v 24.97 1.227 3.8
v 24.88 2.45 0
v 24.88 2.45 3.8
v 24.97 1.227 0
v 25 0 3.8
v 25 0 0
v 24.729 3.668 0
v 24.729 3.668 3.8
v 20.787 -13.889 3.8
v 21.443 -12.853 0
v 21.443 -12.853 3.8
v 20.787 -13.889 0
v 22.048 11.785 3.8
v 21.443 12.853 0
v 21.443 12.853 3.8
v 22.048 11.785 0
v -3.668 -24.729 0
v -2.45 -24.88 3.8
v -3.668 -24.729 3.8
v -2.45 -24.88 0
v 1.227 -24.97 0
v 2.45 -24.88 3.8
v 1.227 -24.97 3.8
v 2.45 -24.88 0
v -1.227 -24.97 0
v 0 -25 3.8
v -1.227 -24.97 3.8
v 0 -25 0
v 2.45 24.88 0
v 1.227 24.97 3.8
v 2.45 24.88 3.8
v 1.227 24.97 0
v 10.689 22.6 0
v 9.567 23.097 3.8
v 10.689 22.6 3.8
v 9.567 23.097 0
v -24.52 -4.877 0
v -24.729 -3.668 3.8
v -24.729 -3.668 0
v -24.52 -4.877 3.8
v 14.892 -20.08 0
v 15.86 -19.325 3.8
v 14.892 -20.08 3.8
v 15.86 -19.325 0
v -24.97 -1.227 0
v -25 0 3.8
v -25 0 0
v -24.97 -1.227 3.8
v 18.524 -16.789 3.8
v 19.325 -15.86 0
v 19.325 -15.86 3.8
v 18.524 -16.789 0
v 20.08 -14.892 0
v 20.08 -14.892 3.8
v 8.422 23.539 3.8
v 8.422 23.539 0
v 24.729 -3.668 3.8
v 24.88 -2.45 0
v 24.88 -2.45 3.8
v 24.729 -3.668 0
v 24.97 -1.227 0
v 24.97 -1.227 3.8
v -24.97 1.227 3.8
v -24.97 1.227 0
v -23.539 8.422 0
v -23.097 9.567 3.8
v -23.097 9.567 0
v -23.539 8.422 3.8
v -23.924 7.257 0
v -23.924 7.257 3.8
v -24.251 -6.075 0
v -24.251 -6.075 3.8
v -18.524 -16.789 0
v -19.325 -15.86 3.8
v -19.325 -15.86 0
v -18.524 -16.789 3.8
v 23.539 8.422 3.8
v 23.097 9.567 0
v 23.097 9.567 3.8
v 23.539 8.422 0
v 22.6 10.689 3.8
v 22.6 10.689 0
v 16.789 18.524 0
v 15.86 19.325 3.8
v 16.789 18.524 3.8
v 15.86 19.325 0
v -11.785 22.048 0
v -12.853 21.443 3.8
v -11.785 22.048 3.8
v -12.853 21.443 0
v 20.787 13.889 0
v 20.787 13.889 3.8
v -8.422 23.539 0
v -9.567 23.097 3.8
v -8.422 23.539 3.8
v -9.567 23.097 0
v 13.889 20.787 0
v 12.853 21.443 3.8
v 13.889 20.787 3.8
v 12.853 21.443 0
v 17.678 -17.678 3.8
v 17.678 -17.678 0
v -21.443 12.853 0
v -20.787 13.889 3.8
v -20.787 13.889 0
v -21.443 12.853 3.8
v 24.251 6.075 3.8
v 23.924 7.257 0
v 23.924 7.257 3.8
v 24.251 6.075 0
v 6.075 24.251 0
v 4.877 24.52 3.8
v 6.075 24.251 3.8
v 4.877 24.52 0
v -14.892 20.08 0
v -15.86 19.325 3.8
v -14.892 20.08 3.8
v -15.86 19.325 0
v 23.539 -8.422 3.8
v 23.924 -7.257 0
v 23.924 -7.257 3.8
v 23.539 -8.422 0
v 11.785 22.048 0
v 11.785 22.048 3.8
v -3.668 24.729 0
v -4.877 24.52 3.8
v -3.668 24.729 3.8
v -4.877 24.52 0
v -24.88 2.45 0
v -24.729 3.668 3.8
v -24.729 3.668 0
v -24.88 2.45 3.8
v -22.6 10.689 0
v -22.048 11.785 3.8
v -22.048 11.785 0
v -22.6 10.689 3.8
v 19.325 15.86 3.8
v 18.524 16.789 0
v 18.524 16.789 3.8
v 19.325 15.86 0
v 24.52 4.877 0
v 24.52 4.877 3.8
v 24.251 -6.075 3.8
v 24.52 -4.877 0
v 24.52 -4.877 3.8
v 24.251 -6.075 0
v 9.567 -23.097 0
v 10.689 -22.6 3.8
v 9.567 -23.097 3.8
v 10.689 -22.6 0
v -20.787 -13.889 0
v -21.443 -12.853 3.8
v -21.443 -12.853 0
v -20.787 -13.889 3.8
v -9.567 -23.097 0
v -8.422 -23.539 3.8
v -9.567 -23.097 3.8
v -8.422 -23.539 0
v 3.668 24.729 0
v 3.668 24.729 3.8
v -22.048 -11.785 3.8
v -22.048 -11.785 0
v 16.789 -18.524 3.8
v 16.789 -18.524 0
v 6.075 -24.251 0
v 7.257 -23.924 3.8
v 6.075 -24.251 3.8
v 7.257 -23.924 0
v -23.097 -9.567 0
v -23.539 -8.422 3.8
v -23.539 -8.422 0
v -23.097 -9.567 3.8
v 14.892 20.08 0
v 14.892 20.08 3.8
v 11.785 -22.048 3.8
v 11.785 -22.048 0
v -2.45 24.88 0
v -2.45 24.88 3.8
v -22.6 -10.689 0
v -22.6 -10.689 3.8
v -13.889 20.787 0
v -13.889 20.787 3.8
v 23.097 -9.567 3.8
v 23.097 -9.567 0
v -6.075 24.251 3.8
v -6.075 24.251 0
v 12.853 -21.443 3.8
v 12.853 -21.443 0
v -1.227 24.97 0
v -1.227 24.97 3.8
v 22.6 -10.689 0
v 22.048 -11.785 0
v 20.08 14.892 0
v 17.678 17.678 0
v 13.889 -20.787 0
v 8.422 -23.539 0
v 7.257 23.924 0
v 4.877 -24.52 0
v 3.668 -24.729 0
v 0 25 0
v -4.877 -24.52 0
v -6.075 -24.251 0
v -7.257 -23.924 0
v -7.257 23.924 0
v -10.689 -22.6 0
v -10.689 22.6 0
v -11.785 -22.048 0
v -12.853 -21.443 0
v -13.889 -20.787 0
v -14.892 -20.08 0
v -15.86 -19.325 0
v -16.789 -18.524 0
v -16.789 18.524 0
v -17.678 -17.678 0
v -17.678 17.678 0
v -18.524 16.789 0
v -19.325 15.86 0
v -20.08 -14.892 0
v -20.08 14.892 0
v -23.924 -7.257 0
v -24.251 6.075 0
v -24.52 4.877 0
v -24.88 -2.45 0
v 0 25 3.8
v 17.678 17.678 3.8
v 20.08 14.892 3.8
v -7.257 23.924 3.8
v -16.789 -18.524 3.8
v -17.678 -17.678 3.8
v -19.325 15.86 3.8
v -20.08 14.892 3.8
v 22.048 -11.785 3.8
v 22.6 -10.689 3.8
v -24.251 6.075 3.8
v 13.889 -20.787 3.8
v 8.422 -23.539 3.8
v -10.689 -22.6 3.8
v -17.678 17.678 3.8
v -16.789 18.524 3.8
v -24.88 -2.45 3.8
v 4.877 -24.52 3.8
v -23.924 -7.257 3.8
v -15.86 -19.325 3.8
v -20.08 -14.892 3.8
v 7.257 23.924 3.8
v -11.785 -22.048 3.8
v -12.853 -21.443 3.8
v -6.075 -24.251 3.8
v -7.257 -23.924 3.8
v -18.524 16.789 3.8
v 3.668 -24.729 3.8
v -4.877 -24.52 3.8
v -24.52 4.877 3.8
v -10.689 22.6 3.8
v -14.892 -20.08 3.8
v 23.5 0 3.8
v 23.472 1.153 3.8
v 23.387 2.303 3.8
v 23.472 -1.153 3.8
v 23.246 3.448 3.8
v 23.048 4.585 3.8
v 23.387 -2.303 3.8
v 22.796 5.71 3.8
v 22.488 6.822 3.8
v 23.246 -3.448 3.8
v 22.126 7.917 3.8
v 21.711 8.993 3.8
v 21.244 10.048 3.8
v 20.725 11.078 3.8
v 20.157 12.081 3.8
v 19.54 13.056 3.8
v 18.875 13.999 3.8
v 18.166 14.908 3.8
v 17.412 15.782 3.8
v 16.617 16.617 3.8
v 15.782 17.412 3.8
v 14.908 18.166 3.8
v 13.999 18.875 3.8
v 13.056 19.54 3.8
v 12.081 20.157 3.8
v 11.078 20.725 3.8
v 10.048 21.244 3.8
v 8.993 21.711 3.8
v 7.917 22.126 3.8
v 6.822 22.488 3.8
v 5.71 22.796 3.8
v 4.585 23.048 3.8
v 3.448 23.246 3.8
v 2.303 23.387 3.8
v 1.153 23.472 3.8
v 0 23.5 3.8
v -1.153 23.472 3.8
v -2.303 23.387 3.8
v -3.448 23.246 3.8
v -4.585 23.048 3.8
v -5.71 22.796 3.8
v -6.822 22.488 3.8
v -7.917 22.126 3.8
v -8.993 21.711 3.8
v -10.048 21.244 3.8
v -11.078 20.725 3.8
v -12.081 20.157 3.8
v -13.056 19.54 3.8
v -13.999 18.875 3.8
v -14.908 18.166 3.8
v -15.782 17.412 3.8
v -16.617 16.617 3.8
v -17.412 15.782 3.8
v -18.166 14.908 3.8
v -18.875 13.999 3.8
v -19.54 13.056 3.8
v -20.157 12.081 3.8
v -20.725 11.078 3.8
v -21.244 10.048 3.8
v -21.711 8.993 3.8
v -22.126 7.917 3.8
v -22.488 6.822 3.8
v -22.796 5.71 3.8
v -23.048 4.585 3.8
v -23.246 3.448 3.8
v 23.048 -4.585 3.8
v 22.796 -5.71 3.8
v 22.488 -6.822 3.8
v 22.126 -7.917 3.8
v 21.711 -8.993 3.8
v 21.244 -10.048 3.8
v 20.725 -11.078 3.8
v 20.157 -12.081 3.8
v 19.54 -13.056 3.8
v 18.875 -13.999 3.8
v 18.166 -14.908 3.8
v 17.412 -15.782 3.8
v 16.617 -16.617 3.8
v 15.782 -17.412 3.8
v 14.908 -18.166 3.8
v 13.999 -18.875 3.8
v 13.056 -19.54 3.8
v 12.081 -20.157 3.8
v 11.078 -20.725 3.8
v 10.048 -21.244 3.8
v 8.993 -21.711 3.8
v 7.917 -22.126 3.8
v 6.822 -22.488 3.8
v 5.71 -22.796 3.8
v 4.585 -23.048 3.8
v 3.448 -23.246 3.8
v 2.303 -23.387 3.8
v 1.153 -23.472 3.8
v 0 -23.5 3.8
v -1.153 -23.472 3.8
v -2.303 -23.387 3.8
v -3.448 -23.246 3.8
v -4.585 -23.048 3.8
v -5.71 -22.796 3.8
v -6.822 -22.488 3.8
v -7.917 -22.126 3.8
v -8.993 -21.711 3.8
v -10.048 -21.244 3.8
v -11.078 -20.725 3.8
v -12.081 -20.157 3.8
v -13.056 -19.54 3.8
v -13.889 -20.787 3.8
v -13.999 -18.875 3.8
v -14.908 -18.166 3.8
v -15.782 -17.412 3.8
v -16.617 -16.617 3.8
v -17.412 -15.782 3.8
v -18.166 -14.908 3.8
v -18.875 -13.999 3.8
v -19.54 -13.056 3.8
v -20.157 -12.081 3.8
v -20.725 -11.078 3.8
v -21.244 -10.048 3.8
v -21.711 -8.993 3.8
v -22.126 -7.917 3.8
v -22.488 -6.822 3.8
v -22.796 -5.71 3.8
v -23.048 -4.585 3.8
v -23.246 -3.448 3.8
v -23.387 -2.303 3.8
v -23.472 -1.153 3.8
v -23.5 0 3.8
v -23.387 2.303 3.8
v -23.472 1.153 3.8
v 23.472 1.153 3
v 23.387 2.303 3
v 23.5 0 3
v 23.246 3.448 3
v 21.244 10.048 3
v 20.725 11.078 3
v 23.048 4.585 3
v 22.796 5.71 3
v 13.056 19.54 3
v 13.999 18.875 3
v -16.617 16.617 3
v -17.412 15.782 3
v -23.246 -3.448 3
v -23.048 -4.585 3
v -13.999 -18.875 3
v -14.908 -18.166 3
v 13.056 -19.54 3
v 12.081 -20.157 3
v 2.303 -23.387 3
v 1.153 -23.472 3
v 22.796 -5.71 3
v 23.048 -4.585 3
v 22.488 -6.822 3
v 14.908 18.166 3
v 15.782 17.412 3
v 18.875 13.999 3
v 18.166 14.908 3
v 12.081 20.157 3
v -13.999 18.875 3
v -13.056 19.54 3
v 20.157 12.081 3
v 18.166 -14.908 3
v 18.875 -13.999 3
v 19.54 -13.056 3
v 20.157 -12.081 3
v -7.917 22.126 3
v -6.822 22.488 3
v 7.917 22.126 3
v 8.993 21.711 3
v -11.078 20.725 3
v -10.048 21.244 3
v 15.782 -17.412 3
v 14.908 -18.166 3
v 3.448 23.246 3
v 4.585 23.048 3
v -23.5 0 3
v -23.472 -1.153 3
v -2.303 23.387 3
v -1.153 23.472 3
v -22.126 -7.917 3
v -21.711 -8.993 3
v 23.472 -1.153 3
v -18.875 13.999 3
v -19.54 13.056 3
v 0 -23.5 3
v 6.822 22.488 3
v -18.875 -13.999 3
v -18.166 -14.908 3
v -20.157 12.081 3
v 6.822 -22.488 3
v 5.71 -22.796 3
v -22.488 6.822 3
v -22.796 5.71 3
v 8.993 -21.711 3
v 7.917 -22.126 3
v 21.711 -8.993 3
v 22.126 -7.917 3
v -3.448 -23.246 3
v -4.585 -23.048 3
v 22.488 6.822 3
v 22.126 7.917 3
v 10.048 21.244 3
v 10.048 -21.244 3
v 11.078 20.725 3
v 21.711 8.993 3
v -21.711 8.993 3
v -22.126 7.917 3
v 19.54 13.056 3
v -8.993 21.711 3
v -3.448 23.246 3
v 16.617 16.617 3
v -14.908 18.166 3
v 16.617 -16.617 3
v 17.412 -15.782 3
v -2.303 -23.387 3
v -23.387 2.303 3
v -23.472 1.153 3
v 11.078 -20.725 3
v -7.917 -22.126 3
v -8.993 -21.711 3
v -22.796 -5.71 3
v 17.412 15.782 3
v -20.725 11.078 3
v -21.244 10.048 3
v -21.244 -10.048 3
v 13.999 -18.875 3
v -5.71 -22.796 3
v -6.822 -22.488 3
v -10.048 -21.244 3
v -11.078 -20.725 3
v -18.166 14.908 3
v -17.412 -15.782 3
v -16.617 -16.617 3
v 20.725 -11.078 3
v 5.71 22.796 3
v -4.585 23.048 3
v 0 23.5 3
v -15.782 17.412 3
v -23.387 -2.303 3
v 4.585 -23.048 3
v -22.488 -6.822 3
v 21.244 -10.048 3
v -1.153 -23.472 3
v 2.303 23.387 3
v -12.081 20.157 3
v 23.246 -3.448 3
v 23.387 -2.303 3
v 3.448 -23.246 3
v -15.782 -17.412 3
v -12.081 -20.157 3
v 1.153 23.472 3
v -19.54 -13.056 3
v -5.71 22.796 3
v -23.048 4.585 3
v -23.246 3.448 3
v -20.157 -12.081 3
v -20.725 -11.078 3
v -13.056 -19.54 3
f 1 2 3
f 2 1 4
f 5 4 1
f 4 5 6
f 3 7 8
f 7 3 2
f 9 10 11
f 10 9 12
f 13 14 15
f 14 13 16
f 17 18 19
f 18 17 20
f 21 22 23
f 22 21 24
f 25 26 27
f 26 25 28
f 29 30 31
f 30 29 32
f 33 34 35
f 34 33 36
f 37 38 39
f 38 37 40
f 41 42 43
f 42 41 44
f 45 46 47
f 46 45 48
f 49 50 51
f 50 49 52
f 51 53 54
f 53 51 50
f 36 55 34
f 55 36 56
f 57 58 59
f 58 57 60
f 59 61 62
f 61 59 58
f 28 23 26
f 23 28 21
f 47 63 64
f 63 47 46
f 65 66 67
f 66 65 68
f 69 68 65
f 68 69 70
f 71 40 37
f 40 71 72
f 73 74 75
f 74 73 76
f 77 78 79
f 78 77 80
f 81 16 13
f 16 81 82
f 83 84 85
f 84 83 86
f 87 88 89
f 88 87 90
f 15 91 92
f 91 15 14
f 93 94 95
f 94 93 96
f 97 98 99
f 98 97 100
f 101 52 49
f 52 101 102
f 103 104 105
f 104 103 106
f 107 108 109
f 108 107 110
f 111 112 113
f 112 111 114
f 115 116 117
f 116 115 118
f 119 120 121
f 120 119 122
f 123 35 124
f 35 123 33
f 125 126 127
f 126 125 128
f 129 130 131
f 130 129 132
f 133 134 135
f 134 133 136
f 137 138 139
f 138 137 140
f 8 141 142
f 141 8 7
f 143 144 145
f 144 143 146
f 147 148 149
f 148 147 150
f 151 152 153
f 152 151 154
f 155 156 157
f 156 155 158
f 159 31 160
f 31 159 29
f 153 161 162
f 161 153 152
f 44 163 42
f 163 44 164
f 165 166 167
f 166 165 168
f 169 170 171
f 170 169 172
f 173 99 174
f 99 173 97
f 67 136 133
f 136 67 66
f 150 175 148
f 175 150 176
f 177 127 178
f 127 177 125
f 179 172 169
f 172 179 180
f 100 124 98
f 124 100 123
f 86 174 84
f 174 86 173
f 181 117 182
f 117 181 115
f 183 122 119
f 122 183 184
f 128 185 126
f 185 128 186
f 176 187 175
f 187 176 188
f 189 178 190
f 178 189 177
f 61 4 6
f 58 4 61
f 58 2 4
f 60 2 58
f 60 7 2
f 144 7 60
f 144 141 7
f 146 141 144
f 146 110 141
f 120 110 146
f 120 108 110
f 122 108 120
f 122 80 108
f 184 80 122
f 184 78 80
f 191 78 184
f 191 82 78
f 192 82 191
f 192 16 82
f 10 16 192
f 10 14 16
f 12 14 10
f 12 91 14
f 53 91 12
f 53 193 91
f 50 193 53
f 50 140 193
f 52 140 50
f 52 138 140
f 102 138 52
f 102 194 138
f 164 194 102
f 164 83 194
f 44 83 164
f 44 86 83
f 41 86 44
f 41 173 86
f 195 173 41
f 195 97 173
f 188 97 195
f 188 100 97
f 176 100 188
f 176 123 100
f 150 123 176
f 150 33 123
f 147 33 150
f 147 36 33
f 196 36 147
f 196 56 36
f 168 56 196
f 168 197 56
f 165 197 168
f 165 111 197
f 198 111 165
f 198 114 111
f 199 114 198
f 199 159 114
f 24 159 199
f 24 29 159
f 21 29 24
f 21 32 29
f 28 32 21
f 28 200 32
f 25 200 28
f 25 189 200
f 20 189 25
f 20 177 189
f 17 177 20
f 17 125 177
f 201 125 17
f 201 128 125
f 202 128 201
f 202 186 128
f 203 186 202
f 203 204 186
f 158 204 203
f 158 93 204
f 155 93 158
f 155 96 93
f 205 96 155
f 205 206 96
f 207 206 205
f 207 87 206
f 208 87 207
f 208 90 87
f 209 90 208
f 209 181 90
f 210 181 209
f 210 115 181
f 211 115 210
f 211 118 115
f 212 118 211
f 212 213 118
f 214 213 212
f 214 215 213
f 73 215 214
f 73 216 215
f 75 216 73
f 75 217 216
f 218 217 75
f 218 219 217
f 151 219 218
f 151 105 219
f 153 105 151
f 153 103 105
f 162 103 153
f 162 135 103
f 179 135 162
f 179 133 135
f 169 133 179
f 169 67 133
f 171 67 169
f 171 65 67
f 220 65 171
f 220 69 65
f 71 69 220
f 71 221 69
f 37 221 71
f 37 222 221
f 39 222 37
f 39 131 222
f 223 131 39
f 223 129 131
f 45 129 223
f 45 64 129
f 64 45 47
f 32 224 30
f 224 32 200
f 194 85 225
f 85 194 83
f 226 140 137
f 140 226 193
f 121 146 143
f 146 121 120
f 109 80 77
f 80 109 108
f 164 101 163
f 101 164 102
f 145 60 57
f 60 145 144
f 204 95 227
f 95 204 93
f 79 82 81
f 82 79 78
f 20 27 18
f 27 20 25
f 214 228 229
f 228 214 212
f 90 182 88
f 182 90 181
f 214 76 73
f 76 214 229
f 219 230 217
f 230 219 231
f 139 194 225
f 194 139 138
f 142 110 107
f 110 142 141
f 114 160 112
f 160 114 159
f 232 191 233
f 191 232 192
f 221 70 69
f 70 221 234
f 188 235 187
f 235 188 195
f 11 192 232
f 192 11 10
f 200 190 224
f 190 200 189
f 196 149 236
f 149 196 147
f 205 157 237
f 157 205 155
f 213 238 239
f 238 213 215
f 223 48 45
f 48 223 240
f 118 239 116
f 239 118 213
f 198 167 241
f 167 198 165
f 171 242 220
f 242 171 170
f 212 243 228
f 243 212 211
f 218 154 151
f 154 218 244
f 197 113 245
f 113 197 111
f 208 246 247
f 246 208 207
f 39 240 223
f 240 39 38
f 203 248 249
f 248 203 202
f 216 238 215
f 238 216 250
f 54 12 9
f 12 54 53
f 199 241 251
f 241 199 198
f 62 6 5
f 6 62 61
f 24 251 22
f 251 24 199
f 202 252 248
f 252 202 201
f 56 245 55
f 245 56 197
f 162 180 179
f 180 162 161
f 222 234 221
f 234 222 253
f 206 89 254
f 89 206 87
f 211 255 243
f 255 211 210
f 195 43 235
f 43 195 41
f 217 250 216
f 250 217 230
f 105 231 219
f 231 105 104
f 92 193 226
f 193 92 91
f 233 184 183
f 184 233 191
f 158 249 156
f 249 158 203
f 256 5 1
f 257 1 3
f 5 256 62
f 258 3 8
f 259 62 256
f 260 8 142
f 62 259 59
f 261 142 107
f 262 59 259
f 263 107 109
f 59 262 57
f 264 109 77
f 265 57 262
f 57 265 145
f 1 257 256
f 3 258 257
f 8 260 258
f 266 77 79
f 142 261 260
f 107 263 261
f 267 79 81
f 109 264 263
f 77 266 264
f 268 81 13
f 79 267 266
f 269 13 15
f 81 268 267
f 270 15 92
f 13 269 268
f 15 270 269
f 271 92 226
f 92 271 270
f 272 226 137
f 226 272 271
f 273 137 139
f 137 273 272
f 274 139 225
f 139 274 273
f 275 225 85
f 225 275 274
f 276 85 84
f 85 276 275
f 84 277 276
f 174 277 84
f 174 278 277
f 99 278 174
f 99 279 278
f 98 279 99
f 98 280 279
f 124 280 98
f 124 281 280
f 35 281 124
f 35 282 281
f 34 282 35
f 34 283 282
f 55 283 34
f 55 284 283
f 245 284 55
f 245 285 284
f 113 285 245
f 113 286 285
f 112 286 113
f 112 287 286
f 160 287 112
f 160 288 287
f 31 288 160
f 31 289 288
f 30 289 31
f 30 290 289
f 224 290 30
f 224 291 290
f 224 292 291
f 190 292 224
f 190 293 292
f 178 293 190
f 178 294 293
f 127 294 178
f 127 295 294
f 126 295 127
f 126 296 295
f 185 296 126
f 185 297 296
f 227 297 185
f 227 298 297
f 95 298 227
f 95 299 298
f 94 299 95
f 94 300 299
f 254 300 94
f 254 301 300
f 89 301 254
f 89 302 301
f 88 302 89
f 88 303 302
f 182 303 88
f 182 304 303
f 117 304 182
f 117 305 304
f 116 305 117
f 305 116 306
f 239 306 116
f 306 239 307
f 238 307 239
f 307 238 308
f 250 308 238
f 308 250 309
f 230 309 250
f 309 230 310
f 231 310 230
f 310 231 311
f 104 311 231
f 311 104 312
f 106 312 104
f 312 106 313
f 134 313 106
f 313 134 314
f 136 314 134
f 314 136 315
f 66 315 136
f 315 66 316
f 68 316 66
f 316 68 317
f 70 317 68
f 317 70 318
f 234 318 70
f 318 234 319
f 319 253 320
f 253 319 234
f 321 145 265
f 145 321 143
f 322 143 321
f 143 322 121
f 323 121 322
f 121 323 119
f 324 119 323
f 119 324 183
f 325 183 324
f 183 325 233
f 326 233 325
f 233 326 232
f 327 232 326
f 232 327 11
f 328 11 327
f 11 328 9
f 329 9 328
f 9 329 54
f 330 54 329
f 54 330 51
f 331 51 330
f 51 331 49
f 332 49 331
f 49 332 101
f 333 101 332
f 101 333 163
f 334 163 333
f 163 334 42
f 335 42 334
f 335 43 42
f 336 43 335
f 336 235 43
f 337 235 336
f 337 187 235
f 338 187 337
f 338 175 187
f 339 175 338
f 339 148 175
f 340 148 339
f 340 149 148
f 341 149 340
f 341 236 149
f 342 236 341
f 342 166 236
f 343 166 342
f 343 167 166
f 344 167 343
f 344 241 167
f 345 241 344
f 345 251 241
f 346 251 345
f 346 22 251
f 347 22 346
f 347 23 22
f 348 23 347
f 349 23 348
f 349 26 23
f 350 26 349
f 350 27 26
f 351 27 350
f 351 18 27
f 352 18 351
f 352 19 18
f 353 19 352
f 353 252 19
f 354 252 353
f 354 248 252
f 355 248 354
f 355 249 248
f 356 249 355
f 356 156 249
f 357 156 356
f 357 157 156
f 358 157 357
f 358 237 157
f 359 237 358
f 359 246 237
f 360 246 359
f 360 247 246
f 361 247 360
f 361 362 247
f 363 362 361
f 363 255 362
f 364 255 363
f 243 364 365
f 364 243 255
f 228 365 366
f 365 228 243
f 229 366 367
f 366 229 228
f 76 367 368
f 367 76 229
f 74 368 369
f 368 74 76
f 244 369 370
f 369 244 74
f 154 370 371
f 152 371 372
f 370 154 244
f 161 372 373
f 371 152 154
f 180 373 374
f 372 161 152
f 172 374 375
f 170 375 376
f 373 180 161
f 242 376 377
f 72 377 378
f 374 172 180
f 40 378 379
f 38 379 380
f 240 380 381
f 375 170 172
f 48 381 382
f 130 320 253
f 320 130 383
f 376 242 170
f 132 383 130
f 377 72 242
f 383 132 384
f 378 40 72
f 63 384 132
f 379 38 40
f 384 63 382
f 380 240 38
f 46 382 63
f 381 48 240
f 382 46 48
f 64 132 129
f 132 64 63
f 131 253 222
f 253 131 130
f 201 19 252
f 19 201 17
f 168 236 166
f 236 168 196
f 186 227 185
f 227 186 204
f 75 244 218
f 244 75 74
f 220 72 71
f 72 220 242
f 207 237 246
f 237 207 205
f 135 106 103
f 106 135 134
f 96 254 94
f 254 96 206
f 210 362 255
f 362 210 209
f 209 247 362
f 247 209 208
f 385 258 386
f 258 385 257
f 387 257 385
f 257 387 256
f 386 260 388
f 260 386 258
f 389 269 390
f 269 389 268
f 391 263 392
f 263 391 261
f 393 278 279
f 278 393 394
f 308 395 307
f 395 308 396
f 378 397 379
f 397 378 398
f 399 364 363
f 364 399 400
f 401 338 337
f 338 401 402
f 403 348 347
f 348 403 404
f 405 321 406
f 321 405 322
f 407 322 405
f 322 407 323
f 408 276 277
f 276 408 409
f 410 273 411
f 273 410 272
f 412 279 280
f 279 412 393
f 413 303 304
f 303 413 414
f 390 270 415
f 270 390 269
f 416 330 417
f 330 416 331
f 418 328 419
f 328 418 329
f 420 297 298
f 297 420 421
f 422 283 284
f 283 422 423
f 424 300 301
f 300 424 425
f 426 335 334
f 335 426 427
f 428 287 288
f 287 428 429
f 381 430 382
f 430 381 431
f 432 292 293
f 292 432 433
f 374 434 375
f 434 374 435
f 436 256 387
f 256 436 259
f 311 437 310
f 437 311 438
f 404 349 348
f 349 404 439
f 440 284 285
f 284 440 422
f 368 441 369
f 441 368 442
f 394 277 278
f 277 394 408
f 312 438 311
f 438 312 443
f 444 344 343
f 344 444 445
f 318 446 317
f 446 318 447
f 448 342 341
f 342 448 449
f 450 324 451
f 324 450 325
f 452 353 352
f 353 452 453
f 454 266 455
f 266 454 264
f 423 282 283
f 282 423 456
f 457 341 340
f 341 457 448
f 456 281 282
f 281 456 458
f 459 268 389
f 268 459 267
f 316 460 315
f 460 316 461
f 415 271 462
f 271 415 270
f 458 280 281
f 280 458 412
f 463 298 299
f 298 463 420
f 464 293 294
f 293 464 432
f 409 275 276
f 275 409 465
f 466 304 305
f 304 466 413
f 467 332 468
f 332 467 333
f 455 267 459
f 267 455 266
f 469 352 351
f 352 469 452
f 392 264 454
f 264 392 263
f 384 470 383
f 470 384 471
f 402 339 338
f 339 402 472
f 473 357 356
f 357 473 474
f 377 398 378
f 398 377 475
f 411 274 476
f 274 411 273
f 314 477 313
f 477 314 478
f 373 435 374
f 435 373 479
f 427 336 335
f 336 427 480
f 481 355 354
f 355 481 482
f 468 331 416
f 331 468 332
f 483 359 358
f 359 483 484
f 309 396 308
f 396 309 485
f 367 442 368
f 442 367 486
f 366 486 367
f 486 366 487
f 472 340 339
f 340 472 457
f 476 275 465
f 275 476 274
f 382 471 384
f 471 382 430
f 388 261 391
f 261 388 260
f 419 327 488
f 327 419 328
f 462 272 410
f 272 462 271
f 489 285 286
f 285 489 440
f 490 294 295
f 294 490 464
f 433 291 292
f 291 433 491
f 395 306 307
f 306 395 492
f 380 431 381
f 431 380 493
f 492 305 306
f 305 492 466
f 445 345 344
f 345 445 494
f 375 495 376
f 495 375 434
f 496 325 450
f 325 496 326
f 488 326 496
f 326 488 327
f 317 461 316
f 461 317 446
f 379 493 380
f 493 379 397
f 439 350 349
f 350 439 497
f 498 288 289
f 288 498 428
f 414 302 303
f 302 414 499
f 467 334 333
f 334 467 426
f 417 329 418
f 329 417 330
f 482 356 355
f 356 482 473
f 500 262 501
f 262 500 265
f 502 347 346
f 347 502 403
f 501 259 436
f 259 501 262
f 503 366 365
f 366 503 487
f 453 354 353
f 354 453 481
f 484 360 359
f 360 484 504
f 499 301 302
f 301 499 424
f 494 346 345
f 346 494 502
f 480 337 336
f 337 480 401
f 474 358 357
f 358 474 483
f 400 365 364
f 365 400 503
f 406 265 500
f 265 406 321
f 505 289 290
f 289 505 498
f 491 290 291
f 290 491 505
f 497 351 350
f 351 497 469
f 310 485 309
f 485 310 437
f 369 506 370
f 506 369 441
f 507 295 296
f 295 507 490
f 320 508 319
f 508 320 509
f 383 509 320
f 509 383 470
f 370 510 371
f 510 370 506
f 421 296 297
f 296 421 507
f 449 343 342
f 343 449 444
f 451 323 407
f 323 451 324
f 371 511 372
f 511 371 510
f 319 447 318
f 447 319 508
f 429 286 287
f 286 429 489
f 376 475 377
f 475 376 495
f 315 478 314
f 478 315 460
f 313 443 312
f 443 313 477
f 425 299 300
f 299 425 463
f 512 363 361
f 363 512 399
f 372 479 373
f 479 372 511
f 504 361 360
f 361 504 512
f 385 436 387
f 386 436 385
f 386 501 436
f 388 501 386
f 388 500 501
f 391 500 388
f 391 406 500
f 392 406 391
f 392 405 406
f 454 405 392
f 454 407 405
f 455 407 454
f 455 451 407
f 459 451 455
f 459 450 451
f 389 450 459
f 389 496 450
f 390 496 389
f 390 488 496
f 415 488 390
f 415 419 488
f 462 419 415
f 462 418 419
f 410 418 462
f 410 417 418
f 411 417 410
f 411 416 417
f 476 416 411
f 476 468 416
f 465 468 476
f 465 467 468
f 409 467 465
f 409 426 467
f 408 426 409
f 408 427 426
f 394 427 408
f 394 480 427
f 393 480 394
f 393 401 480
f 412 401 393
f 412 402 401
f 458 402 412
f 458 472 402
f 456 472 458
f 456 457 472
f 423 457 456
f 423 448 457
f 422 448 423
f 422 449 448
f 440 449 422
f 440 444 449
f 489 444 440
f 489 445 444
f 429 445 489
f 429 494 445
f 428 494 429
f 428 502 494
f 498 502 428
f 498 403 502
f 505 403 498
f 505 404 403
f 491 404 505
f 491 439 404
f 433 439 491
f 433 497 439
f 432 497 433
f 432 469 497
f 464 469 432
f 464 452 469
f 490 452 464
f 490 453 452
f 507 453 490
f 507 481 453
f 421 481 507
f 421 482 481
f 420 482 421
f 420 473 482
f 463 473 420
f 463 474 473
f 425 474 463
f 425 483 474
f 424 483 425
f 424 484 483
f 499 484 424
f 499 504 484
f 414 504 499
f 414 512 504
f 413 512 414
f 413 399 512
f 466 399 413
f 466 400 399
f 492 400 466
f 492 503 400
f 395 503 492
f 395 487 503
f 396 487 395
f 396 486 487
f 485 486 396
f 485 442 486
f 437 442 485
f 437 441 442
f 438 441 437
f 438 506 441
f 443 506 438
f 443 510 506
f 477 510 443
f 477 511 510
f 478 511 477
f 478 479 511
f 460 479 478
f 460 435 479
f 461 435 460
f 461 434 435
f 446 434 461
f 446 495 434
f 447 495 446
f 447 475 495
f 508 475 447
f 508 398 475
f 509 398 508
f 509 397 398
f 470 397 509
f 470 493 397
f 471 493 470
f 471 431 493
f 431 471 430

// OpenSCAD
COIN_D=50; COIN_T=3.0; RIM_W=1.5; RIM_H=0.8; FN=128;
union() {
    cylinder(d=COIN_D, h=COIN_T, $fn=FN);
    difference() {
        cylinder(d=COIN_D, h=COIN_T+RIM_H, $fn=FN);
        cylinder(d=COIN_D-RIM_W*2, h=COIN_T+RIM_H+1, $fn=FN);
    }
}
